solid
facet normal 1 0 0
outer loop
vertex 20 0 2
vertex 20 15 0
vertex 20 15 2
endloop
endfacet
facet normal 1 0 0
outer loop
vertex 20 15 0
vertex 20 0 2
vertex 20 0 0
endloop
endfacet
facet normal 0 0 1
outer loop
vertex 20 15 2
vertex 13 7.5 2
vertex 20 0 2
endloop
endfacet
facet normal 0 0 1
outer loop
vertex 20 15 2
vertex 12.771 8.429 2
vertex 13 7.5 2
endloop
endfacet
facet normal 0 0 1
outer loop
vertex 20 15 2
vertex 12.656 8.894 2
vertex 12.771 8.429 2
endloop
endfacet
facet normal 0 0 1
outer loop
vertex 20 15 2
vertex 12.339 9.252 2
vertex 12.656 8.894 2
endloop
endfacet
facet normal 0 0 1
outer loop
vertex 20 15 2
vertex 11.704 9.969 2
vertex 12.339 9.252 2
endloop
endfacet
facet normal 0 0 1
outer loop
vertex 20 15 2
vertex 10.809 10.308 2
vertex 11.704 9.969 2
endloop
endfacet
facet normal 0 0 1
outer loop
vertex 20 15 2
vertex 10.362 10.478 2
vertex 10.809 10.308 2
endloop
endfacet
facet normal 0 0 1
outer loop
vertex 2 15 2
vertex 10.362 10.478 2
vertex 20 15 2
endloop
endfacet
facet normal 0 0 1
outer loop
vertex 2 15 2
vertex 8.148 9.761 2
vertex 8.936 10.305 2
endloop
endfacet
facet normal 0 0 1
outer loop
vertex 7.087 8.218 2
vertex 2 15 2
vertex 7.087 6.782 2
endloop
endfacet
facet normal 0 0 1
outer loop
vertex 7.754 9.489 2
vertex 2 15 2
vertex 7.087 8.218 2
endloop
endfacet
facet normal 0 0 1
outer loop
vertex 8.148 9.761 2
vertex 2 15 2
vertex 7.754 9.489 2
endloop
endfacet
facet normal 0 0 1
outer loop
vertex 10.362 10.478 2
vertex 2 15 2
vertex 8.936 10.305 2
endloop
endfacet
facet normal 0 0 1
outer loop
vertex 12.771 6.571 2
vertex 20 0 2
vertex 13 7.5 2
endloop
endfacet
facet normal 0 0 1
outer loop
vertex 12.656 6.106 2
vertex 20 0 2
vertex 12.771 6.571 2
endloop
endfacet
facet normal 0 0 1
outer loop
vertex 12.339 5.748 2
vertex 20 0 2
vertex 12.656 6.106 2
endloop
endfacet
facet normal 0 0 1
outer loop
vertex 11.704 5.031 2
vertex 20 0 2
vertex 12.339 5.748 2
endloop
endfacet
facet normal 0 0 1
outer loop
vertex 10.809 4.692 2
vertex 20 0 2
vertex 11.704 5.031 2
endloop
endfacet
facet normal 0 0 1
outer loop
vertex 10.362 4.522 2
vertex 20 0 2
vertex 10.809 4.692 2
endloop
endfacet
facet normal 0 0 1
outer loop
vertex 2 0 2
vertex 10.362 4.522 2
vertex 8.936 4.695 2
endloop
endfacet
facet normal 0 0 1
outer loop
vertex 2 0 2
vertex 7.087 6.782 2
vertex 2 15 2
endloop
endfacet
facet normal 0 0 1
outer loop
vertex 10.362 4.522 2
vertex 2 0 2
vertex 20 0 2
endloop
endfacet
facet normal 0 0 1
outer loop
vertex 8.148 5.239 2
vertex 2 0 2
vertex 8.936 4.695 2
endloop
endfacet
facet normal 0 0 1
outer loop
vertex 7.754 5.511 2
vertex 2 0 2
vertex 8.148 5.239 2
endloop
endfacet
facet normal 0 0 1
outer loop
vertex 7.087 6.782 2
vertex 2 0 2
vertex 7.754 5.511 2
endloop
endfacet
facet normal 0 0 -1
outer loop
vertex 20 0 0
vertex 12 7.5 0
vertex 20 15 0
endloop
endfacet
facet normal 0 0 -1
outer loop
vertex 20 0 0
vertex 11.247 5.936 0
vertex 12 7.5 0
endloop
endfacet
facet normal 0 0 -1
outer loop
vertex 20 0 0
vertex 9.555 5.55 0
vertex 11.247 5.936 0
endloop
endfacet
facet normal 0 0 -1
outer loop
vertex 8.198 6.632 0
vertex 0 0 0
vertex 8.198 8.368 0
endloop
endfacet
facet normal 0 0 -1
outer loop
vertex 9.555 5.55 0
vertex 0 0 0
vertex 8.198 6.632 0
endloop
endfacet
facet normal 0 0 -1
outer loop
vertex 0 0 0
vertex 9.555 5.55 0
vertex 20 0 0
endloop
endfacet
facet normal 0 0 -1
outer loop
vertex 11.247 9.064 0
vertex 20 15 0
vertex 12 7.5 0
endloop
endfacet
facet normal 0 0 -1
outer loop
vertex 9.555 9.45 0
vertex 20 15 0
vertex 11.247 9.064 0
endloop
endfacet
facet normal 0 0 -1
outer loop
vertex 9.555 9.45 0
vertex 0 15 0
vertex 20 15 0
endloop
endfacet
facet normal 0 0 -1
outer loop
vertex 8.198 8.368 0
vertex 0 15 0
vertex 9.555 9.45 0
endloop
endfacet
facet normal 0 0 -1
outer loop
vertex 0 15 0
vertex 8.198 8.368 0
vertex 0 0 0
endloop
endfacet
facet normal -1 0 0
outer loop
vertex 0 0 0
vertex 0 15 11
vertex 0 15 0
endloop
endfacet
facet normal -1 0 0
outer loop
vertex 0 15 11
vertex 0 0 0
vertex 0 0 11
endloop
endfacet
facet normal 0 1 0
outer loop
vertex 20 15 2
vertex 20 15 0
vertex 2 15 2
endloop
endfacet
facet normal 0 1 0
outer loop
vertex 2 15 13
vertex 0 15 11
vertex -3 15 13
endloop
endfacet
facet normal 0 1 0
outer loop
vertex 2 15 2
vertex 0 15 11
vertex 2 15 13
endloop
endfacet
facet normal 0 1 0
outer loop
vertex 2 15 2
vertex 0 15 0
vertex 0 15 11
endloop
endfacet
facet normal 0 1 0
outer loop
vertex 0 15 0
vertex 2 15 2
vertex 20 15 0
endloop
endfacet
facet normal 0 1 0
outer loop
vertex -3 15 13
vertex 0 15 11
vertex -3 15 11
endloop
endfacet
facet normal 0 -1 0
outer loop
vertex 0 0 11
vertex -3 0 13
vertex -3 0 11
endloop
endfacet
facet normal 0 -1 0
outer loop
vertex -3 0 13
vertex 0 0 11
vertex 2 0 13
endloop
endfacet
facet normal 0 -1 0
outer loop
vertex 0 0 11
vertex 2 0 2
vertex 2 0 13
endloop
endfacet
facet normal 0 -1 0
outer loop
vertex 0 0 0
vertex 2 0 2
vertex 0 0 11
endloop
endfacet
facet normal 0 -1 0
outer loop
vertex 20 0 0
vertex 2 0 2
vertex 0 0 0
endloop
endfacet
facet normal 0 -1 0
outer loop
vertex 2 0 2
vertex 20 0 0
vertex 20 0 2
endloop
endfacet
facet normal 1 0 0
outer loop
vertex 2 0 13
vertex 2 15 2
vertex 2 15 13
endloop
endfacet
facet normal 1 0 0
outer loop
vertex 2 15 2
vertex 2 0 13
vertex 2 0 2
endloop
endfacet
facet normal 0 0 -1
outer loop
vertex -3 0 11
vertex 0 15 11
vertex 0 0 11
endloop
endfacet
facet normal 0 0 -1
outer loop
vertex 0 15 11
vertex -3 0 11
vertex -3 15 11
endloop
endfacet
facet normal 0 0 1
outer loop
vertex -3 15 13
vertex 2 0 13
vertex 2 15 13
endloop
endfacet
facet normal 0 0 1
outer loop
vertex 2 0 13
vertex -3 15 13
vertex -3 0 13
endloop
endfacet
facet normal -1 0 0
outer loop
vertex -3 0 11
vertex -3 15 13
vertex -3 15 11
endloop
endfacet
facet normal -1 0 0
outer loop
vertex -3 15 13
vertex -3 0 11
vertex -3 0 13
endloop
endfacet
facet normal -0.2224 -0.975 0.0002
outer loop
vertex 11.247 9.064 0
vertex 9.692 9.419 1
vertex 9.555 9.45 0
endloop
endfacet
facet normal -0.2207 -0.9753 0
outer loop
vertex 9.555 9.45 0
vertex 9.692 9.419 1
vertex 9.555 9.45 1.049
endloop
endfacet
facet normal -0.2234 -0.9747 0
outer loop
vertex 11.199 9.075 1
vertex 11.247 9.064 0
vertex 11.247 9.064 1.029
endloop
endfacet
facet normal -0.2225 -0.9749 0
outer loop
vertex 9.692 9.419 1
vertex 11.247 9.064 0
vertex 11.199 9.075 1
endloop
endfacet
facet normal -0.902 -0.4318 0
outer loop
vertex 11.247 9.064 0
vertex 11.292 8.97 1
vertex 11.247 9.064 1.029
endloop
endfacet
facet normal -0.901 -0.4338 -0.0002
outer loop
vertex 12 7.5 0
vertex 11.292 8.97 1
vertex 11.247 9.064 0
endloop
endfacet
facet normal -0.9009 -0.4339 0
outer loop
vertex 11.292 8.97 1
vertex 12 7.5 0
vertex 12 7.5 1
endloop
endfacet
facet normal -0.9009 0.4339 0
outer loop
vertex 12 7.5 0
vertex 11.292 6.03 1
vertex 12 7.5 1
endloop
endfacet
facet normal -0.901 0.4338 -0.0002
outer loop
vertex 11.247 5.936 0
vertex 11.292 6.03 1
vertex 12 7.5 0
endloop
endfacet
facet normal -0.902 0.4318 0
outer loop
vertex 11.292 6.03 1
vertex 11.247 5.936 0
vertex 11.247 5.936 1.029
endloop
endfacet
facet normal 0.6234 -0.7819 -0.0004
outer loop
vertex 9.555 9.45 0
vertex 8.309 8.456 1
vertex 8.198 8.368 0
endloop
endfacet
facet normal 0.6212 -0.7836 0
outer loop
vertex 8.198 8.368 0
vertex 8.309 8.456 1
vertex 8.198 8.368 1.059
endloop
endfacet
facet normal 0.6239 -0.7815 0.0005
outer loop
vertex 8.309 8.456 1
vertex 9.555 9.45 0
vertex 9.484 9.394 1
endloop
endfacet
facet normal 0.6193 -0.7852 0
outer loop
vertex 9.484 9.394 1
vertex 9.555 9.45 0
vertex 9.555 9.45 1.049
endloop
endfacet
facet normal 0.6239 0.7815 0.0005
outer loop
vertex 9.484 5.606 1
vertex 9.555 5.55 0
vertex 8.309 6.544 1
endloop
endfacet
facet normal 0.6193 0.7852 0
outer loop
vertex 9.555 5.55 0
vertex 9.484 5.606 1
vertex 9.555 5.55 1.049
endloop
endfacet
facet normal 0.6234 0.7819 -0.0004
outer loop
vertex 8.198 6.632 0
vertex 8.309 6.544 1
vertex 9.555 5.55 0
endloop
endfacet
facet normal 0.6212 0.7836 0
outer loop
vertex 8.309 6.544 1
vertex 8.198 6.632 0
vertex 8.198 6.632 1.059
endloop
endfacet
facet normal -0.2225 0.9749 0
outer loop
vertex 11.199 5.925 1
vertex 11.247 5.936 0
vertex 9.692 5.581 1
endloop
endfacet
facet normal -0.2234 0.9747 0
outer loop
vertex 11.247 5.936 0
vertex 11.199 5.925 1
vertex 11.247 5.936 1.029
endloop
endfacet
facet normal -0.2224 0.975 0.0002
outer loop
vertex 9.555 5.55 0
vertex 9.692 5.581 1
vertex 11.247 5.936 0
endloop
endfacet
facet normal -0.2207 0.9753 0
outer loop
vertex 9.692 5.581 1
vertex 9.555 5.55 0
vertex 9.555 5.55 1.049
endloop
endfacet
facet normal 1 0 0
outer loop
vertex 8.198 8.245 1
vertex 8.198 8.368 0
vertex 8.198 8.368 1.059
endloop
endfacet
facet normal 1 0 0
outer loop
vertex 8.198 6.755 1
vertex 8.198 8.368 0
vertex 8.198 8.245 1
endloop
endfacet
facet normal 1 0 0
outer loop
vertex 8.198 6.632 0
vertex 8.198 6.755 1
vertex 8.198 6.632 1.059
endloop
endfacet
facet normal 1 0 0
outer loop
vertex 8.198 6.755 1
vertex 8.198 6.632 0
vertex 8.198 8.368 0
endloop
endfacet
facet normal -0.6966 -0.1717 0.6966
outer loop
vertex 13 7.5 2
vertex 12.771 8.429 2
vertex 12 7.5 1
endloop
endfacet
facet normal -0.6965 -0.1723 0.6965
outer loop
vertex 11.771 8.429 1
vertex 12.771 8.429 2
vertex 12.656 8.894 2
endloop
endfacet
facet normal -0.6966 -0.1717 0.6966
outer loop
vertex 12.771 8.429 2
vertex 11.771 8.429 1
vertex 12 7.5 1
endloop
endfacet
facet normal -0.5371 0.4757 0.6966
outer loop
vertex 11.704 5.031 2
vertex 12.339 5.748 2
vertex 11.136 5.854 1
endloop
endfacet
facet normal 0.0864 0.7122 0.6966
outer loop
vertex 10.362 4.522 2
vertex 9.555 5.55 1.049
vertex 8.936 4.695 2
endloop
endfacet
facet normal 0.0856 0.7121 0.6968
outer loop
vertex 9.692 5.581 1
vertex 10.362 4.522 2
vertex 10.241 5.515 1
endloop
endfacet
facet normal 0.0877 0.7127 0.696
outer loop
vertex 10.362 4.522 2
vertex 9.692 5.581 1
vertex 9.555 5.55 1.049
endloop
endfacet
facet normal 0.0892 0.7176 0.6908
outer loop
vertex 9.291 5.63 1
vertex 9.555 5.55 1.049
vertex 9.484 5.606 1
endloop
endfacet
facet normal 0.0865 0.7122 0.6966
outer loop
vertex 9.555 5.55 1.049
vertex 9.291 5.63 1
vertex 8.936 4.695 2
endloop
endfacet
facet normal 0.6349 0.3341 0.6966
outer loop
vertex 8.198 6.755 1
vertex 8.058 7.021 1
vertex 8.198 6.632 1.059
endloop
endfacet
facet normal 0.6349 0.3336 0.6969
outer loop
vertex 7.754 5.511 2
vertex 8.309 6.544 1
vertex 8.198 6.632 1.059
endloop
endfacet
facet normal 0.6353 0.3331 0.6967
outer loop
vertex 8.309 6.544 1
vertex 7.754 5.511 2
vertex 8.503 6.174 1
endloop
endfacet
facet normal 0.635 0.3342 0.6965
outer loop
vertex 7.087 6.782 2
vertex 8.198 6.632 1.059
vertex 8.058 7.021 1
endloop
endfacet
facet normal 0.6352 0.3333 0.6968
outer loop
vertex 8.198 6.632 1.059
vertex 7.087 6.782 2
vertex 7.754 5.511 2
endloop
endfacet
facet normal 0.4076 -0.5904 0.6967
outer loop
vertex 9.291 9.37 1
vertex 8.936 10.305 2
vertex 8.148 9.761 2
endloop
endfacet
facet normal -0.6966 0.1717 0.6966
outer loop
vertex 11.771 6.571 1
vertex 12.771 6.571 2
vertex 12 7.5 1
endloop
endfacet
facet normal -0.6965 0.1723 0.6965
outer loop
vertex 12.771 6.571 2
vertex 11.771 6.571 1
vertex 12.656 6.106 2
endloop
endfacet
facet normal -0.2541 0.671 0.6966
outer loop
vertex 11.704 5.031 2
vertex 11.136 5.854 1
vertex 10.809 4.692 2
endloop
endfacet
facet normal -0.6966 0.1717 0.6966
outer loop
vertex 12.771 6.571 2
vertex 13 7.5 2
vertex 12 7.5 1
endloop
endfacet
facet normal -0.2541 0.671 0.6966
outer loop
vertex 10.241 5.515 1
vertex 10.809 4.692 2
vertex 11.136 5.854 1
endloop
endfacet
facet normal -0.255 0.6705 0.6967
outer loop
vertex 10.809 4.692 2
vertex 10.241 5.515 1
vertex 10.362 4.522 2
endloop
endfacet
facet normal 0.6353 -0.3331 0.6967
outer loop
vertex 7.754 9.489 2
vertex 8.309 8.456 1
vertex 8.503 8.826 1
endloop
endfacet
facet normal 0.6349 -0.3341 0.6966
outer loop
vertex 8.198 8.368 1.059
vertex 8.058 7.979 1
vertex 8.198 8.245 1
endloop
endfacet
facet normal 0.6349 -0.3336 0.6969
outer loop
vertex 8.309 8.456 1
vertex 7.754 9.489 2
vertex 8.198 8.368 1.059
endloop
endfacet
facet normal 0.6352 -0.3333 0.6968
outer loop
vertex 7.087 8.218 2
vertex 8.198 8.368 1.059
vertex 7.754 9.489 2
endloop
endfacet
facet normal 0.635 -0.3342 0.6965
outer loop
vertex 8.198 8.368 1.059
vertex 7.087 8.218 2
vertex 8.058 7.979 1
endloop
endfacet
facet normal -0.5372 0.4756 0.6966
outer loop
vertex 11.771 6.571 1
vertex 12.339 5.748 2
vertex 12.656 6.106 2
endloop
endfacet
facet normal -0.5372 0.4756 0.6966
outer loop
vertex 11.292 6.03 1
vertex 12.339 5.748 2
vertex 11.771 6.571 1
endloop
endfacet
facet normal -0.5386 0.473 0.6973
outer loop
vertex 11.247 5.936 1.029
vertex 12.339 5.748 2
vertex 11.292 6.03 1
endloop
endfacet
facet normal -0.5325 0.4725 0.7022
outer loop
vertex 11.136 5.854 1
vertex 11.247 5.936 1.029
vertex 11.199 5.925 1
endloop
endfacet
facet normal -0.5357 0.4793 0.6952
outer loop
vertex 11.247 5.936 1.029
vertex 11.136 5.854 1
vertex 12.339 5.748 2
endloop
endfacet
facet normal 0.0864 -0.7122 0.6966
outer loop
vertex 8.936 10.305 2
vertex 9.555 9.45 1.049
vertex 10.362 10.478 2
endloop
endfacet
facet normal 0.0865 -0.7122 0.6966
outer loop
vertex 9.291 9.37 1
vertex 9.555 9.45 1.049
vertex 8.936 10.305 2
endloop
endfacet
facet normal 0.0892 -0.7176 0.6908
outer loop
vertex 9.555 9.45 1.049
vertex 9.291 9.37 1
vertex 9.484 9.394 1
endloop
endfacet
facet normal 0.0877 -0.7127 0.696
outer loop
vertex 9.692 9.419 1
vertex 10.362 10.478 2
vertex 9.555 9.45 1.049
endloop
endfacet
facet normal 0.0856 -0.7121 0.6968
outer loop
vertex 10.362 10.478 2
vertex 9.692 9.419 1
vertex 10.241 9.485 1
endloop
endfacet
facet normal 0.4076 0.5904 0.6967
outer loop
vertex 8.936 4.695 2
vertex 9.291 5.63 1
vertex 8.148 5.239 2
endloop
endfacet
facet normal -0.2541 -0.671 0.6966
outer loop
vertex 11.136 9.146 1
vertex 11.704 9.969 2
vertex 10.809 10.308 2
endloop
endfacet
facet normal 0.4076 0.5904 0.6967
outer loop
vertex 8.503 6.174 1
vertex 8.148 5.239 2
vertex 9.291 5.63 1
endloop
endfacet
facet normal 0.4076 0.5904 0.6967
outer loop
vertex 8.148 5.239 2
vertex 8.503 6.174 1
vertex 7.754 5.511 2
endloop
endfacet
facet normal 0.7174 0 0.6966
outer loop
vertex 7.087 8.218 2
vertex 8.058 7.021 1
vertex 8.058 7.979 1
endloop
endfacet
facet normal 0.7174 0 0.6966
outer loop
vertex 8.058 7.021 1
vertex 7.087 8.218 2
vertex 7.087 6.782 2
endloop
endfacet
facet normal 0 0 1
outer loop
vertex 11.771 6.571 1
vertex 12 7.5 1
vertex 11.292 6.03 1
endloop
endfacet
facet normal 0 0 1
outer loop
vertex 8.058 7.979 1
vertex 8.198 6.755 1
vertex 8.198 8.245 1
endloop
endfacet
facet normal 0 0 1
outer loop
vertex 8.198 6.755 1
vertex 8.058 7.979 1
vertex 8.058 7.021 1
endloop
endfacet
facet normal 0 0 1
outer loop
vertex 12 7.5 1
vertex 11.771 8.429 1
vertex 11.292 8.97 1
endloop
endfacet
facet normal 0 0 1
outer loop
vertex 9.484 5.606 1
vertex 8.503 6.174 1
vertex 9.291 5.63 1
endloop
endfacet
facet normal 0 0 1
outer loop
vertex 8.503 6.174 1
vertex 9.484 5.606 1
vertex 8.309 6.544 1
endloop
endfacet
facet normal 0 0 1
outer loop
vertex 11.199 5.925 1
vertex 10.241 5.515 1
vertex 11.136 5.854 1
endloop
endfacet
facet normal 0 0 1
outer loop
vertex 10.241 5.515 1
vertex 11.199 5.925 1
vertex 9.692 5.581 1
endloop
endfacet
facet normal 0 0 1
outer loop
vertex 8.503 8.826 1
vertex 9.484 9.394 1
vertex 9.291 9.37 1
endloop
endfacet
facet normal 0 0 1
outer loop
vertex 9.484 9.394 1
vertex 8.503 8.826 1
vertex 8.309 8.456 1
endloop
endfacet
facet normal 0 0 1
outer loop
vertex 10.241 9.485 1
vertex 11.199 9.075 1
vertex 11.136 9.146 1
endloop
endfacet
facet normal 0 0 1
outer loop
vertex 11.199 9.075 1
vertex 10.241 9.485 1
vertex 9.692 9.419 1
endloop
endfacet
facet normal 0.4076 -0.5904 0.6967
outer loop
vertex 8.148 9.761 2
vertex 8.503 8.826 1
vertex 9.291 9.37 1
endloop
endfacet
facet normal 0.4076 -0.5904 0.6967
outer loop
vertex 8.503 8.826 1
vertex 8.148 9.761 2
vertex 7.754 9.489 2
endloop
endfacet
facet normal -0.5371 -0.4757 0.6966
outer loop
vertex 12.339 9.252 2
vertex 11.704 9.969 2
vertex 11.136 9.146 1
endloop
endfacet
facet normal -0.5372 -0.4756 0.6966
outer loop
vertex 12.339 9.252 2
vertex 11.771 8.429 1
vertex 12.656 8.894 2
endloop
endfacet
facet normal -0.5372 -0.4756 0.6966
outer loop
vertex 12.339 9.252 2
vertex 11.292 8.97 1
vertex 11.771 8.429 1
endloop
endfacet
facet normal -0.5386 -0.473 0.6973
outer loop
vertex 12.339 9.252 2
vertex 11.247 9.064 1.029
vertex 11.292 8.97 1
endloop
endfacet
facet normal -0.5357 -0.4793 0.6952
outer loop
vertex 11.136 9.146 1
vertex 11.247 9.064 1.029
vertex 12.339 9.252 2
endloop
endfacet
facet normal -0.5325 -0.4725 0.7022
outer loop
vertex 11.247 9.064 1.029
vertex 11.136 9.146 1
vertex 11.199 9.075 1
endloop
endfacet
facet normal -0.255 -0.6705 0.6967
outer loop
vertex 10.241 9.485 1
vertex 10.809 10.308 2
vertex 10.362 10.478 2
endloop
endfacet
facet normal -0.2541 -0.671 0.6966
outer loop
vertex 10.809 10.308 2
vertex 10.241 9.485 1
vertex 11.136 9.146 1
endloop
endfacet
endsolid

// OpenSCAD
w = 20;
w2 = 5;
l = 15;
d = 2;
h = 11;

difference() {
    union() {
        cube([w,l,d]);
        cube([d,l,h]);
        translate([-w2+d,0,h]) cube([w2,l,d]);
    }

    translate([w/2,l/2,0])cylinder(d,2,2);
    translate([w/2,l/2,d/2])cylinder(d,2,4);
}
